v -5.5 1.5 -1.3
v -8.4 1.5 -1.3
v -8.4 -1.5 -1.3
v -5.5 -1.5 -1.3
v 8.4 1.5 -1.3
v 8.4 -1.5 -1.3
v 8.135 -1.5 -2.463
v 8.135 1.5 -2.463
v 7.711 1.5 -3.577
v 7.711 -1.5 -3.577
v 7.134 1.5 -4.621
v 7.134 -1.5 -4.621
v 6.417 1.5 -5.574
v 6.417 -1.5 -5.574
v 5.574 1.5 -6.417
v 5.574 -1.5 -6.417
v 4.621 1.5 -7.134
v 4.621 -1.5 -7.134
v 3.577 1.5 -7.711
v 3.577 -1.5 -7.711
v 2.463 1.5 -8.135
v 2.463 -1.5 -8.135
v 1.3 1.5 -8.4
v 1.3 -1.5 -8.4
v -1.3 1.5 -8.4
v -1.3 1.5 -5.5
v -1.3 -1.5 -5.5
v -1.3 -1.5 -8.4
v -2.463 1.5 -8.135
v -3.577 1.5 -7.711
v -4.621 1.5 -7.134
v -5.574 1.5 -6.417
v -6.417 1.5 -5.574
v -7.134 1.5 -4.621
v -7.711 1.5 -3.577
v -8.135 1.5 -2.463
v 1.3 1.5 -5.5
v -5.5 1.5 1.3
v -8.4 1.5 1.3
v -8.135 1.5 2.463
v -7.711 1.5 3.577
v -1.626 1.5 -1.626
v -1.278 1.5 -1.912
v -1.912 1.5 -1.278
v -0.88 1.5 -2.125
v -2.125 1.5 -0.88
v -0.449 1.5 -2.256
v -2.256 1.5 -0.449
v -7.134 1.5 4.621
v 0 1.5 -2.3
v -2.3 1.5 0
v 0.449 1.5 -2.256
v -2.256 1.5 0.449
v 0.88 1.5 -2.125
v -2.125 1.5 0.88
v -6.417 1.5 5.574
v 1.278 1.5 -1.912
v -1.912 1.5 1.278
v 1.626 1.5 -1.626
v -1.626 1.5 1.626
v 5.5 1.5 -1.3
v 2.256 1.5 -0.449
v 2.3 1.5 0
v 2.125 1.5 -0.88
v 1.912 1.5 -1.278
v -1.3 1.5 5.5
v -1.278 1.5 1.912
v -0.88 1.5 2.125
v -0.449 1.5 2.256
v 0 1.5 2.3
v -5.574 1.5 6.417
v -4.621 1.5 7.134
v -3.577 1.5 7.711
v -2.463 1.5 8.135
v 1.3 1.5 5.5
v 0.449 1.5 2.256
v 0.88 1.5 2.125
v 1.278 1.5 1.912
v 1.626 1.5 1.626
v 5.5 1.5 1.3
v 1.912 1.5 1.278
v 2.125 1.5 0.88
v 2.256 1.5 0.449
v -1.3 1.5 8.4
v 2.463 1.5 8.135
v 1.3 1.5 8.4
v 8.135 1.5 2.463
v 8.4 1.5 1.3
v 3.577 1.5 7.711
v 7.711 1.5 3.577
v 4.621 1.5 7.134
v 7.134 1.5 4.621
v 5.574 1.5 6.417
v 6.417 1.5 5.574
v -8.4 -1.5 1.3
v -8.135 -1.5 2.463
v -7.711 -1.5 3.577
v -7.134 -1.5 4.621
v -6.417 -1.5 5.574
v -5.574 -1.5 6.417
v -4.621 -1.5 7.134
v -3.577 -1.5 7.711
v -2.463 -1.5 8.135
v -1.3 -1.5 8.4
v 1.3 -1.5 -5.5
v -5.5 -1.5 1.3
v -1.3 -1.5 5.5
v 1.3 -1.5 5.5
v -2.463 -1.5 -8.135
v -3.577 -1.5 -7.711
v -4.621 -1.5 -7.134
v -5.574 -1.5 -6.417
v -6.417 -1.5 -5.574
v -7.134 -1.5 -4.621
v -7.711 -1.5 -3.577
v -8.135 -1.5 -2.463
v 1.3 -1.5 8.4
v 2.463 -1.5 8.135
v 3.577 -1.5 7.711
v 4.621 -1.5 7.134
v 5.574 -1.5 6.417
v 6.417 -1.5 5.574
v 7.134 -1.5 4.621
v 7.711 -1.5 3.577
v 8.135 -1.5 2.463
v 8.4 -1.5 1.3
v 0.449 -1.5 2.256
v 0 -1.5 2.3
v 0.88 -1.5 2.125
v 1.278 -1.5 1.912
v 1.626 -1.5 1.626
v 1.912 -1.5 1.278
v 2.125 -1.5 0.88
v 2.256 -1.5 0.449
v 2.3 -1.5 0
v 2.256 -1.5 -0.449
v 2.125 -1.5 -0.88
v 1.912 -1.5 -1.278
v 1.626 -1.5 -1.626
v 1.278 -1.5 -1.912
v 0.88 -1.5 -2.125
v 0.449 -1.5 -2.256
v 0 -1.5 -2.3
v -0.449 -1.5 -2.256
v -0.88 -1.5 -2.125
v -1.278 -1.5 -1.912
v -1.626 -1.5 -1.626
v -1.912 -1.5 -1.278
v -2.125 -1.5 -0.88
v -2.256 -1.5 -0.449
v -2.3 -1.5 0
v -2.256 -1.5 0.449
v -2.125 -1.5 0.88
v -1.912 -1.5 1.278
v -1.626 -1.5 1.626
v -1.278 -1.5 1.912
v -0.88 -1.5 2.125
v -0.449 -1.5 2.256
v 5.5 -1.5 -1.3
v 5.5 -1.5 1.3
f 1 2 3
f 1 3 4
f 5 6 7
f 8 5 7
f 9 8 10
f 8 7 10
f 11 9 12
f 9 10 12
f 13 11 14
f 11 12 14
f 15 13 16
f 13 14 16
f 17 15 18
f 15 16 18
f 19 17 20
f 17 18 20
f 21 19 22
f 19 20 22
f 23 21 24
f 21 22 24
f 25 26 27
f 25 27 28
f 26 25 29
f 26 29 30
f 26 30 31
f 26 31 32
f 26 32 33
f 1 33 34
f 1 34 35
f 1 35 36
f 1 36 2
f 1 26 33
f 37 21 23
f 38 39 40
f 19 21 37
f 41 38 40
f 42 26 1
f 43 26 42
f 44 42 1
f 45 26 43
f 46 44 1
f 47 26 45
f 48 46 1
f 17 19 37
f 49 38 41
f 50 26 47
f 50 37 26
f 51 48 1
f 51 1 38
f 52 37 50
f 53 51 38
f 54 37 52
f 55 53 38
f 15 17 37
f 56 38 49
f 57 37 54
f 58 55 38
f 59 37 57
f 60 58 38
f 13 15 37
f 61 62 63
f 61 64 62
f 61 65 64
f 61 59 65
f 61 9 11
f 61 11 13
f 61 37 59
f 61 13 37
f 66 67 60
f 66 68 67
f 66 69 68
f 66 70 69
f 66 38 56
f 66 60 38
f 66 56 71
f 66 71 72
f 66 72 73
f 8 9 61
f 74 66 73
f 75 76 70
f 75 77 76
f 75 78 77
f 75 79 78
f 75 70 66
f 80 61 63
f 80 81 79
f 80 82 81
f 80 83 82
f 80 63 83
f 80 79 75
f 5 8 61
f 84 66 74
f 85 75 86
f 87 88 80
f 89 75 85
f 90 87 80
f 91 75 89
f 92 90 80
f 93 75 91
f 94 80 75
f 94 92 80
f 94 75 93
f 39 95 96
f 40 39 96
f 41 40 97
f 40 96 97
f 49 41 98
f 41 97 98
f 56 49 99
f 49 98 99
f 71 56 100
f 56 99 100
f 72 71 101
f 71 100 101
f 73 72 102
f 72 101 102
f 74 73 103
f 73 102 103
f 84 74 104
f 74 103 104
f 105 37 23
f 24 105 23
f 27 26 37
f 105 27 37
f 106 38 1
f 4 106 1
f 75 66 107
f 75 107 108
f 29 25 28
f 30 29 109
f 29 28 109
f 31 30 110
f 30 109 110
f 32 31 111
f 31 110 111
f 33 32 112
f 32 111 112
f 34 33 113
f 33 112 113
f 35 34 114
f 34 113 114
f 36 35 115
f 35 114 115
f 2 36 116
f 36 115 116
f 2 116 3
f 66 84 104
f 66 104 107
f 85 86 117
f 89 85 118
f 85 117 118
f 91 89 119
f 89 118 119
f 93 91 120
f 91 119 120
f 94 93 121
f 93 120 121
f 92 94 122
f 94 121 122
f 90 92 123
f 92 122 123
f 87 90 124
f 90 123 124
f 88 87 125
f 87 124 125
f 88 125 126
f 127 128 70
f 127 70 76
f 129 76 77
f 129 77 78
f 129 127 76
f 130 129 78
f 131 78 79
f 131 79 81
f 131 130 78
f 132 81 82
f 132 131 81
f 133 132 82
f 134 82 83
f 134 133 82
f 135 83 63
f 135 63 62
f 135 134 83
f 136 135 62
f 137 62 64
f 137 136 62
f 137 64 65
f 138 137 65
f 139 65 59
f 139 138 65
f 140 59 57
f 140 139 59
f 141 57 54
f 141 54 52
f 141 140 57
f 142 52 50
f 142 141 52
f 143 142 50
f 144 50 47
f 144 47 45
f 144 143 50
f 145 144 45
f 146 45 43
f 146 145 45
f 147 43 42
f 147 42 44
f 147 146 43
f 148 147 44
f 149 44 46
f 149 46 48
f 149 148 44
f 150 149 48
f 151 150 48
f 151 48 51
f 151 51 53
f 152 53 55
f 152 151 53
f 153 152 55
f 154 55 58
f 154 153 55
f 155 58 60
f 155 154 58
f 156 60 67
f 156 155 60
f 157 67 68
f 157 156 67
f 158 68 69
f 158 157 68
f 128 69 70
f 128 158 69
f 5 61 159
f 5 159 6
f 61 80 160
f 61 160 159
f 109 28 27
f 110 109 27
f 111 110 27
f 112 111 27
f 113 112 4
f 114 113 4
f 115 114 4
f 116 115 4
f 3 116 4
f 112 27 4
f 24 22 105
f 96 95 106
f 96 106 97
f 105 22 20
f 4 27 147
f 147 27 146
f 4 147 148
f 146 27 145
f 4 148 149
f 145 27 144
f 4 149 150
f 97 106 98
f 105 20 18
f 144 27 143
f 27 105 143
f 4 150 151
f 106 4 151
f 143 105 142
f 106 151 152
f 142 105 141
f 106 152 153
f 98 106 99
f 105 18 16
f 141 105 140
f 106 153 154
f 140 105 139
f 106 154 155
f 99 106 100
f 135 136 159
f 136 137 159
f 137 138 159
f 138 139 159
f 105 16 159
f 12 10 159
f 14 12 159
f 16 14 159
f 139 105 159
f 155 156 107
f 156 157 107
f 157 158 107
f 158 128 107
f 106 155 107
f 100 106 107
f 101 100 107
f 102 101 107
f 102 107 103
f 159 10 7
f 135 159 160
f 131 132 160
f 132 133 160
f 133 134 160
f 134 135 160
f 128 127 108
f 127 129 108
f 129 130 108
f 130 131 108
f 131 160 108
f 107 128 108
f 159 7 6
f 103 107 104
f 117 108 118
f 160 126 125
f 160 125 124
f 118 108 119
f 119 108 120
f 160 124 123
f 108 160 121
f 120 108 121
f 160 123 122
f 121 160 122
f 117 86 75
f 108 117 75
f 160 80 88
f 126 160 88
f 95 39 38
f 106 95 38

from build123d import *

# Parameters (mm, degrees)
BOSS_EXTRUDE1_DEPTH      = 1.5
BOSS_EXTRUDE1_DEPTH_BACK = 1.5
SKETCH1_R                = 8.5
SKETCH1_R_2              = 2.3
SKETCH2_W                = 3
SKETCH2_H                = 2.6
SKETCH2_W_2              = 2.6
SKETCH2_H_2              = 3
CUT_EXTRUDE1_DEPTH       = 13.389511693


with BuildPart() as part:
    # Sketch1 → Boss-Extrude1 (new, two sides: drawn at the far end of the back side and taken through both)
    with BuildSketch(Plane(origin=(0, 0, 0), x_dir=(1, 0, 0), z_dir=(0, 1, 0)).offset(-BOSS_EXTRUDE1_DEPTH_BACK)):
        Circle(SKETCH1_R)
        Circle(SKETCH1_R_2, mode=Mode.SUBTRACT)
    extrude(amount=BOSS_EXTRUDE1_DEPTH + BOSS_EXTRUDE1_DEPTH_BACK)

    # Sketch2 → Cut-Extrude1 (cut, through all)
    with BuildSketch(Plane(origin=(0, 1.5, 0), x_dir=(1, 0, 0), z_dir=(0, 1, 0))):
        with Locations((-7, 0)):
            Rectangle(SKETCH2_W, SKETCH2_H)
        with Locations((0, -7)):
            Rectangle(SKETCH2_W_2, SKETCH2_H_2)
        with Locations((0, 7)):
            Rectangle(SKETCH2_W_2, SKETCH2_H_2)
        with Locations((7, 0)):
            Rectangle(SKETCH2_W, SKETCH2_H)
    extrude(amount=-CUT_EXTRUDE1_DEPTH, mode=Mode.SUBTRACT)


solid = part.part
